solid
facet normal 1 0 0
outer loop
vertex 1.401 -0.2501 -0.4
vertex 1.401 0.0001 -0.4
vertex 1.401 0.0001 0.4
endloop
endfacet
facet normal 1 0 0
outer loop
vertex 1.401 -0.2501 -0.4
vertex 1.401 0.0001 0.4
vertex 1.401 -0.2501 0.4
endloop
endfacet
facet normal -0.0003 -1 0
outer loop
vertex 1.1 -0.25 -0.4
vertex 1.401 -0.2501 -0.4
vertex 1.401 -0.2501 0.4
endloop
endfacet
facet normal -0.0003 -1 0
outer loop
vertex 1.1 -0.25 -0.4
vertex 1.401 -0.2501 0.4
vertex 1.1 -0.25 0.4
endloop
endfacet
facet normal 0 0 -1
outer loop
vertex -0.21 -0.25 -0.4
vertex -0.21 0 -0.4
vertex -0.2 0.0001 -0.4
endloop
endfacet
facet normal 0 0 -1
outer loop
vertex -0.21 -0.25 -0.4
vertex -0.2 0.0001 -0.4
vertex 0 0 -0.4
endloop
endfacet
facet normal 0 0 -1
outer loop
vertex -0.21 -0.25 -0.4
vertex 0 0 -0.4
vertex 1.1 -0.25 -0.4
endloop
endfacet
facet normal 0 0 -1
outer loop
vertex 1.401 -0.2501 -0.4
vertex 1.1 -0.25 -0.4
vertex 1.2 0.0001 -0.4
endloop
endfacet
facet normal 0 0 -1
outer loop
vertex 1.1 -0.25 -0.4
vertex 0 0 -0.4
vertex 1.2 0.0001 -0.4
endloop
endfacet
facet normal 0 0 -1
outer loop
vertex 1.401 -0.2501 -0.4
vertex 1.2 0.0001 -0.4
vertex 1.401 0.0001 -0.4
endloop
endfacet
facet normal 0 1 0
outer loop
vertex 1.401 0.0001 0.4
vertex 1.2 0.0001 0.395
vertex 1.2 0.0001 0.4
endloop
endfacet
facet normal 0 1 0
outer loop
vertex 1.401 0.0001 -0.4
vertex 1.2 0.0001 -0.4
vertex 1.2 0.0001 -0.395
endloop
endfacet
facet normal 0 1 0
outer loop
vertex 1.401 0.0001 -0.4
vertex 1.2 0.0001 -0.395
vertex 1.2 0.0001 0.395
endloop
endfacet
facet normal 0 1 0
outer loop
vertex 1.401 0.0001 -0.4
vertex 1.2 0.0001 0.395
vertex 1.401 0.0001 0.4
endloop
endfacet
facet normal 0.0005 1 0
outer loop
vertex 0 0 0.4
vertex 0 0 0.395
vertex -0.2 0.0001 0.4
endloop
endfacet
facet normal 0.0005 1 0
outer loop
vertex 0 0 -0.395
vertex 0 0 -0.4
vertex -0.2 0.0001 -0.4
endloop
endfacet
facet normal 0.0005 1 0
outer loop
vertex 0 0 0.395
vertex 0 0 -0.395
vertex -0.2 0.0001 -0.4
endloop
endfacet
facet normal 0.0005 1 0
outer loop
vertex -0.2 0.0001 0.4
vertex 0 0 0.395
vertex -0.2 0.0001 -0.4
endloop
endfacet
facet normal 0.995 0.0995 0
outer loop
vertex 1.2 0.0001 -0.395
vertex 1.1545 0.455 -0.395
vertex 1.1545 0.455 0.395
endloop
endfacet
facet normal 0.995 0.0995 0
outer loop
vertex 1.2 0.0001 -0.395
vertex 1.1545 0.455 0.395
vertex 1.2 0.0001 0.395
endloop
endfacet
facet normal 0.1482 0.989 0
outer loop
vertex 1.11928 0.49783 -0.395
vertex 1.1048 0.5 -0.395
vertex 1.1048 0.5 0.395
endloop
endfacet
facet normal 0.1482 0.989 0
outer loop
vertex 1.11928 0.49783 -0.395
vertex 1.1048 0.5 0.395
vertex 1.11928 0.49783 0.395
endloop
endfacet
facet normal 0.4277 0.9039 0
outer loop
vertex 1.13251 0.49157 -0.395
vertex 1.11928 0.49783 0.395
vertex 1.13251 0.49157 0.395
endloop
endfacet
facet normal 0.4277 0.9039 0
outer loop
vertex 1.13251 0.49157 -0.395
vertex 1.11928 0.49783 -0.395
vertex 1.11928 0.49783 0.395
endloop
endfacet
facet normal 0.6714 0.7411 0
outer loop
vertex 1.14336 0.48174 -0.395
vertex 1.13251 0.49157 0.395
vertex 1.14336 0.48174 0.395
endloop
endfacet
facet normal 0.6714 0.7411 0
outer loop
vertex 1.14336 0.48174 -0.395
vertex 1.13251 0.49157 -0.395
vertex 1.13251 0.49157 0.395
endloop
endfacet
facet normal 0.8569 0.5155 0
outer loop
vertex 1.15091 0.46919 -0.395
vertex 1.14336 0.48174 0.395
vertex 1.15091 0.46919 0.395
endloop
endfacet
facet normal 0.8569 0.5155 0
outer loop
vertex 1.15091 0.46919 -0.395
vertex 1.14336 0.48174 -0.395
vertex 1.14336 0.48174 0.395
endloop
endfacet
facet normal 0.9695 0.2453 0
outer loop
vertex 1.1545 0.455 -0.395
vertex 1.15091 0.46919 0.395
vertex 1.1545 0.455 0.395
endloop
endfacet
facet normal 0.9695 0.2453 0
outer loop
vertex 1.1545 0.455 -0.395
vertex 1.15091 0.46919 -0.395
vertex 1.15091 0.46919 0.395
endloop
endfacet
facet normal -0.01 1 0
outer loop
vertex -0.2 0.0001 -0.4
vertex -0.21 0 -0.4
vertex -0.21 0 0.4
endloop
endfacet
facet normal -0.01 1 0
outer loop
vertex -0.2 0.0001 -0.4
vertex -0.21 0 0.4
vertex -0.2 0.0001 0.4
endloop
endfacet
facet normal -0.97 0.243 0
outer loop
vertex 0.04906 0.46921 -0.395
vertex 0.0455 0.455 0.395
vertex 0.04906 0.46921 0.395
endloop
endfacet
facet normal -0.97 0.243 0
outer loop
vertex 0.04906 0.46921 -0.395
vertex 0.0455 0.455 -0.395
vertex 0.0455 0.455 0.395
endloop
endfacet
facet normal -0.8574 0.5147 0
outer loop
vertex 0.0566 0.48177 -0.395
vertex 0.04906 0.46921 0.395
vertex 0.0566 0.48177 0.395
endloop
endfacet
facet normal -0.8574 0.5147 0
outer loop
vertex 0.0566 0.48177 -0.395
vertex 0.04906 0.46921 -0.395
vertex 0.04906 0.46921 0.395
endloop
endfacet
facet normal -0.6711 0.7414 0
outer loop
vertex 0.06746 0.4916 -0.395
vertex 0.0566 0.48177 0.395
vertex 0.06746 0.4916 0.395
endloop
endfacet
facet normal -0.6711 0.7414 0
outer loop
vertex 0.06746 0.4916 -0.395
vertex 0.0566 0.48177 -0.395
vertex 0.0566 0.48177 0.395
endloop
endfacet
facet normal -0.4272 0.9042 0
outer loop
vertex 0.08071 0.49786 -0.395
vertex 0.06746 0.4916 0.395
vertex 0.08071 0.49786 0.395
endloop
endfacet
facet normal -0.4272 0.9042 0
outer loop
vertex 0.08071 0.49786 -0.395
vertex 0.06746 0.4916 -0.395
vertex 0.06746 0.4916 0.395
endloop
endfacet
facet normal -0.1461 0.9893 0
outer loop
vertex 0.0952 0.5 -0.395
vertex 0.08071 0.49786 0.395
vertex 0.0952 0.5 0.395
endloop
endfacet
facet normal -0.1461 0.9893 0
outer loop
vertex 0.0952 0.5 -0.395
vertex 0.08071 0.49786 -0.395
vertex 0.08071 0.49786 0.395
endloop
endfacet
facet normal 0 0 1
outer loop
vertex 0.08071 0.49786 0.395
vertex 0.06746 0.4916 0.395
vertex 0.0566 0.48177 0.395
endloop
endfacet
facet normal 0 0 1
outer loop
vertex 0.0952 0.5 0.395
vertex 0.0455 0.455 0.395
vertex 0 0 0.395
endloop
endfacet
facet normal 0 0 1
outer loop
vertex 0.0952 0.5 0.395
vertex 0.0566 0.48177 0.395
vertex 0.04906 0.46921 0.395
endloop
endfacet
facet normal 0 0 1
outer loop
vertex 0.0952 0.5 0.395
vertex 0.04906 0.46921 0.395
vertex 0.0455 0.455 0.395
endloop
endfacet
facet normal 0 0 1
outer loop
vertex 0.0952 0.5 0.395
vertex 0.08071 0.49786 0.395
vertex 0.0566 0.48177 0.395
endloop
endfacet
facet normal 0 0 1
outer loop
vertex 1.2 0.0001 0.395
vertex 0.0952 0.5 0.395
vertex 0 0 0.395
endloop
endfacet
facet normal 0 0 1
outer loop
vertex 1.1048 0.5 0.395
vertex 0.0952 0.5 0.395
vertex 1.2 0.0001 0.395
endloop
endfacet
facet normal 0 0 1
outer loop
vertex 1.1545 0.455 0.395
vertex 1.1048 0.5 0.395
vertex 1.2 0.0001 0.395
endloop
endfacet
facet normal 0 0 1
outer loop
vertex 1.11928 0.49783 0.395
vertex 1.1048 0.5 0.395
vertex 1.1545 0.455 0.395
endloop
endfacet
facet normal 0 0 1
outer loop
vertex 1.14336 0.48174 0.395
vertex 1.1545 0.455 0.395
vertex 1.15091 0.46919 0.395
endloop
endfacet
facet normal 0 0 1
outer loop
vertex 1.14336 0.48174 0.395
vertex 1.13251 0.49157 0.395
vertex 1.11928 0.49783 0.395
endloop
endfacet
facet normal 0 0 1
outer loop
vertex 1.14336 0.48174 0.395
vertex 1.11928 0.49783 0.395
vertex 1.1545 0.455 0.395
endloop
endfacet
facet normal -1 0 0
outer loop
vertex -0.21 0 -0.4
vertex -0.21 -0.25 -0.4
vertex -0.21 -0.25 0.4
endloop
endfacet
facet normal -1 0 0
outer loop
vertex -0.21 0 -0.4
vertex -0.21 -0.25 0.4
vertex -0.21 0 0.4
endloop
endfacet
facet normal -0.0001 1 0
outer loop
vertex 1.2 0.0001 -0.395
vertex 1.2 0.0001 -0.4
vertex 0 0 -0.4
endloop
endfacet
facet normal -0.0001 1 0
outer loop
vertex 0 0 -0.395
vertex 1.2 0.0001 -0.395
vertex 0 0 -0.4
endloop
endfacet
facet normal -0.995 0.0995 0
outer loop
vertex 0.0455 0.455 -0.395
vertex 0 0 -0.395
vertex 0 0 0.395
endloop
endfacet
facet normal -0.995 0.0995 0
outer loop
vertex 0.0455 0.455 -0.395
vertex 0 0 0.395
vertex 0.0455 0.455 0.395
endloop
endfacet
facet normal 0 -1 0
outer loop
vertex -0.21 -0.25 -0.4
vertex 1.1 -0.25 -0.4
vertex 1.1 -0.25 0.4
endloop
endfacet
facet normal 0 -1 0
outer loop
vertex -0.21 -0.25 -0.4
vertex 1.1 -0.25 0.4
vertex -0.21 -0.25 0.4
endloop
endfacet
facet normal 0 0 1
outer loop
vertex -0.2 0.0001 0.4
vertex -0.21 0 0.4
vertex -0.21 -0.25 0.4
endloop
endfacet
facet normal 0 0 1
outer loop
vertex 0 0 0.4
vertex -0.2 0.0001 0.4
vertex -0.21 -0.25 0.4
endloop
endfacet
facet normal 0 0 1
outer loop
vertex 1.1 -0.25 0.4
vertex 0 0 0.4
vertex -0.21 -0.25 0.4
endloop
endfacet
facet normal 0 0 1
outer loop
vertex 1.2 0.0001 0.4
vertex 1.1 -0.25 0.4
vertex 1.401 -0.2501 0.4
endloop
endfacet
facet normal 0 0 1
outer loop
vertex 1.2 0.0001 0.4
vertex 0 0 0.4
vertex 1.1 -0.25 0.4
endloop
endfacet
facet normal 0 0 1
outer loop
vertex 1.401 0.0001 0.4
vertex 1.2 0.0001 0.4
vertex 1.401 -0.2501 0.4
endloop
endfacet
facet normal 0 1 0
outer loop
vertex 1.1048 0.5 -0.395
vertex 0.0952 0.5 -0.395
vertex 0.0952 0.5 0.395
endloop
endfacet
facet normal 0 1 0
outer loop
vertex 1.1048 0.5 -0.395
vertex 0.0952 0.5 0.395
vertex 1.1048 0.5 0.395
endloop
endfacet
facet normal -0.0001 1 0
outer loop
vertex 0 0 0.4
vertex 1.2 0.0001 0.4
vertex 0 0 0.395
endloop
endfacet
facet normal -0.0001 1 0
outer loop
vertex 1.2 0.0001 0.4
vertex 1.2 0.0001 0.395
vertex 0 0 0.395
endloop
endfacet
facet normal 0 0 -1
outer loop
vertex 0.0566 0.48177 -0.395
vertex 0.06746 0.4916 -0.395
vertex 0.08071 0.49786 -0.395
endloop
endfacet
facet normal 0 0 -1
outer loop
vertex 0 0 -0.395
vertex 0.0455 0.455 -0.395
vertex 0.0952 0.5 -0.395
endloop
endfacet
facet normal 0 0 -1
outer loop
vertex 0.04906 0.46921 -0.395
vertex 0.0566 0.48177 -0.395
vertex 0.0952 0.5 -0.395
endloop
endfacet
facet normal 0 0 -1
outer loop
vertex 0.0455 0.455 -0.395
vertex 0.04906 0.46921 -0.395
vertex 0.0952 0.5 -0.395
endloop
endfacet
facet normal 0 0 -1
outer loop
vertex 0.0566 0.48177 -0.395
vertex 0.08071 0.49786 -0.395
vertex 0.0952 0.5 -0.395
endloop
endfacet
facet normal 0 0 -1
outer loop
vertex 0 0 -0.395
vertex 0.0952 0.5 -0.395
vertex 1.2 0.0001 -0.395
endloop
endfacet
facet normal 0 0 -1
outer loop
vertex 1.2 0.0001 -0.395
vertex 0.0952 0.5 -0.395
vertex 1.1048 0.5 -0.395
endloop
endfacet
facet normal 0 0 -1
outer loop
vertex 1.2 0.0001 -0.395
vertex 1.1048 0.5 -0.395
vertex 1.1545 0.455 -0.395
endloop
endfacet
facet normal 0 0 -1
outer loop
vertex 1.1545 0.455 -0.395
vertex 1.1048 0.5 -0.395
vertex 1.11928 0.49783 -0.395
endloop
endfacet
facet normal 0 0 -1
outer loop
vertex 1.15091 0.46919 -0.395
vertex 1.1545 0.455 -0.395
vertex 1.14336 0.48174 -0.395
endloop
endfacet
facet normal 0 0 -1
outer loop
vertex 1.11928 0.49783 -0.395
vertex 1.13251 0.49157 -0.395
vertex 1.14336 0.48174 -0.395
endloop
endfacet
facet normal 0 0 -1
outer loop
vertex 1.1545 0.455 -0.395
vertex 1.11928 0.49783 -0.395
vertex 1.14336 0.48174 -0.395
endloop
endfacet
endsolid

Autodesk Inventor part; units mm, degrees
ref_plane "YZ Plane" through (0, 0, 0) normal (1, 0, 0) x (0, 1, 0)
ref_plane "XZ Plane" through (0, 0, 0) normal (0, 1, 0) x (-1, 0, 0)
sketch "Sketch1" plane through (0, 0, 0) normal (0, 0, 1) x (1, 0, 0)
  line L0 (1.1, -0.25) -> (0.1, -0.25)
  line L1 (1.1, -0.25) -> (1.1, -0.2501)
  line L2 (1.401, -0.2501) -> (1.1, -0.2501)
  line L3 (1.401, 0.0001) -> (1.401, -0.2501)
  line L4 (1.2, 0.0001) -> (1.401, 0.0001)
  line L5 (1.2, 0) -> (1.2, 0.0001)
  line L6 (1.2, 0) -> (0, 0)
  line L7 (0, 0) -> (0, 0.0001)
  line L8 (0, 0.0001) -> (-0.2, 0.0001)
  line L9 (-0.2, 0) -> (-0.2, 0.0001)
  line L10 (-0.21, 0) -> (-0.2, 0)
  line L11 (-0.21, -0.25) -> (-0.21, 0)
  line L12 (-0.21, -0.25) -> (-0.2, -0.25)
  line L13 (-0.2, -0.25) -> (-0.2, -0.2501)
  line L14 (0.1, -0.2501) -> (-0.2, -0.2501)
  line L15 (0.1, -0.25) -> (0.1, -0.2501)
  line L16 (0.0952, 0.5) -> (1.1048, 0.5)
  arc A0 (0.0952, 0.5) -> (0.0455, 0.455) centre (0.0952, 0.45) ccw
  line L17 (0, 0) -> (0.0455, 0.455)
  line L18 (1.2, 0) -> (0, 0)
  line L19 (1.1545, 0.455) -> (1.2, 0)
  arc A1 (1.1545, 0.455) -> (1.1048, 0.5) centre (1.1048, 0.45) ccw
  point P0 (0.6, -0.125)
extrude "Extrusion1" add sketch "Sketch1" along normal mid plane 0.8 contours L0 L14 L12 L11 L10 L8 L6 L4 L3 L2
extrude "Extrusion2" add sketch "Sketch1" along normal mid plane 0.79 contours L6 L17 A0 L16 A1 L19
ref_plane "Work Plane1" through (0.5955, -0.2501, 0.4) normal (1, 0, 0) x (0, 0, -1)
properties part number "LED_1608" material "ABS Plastic"
